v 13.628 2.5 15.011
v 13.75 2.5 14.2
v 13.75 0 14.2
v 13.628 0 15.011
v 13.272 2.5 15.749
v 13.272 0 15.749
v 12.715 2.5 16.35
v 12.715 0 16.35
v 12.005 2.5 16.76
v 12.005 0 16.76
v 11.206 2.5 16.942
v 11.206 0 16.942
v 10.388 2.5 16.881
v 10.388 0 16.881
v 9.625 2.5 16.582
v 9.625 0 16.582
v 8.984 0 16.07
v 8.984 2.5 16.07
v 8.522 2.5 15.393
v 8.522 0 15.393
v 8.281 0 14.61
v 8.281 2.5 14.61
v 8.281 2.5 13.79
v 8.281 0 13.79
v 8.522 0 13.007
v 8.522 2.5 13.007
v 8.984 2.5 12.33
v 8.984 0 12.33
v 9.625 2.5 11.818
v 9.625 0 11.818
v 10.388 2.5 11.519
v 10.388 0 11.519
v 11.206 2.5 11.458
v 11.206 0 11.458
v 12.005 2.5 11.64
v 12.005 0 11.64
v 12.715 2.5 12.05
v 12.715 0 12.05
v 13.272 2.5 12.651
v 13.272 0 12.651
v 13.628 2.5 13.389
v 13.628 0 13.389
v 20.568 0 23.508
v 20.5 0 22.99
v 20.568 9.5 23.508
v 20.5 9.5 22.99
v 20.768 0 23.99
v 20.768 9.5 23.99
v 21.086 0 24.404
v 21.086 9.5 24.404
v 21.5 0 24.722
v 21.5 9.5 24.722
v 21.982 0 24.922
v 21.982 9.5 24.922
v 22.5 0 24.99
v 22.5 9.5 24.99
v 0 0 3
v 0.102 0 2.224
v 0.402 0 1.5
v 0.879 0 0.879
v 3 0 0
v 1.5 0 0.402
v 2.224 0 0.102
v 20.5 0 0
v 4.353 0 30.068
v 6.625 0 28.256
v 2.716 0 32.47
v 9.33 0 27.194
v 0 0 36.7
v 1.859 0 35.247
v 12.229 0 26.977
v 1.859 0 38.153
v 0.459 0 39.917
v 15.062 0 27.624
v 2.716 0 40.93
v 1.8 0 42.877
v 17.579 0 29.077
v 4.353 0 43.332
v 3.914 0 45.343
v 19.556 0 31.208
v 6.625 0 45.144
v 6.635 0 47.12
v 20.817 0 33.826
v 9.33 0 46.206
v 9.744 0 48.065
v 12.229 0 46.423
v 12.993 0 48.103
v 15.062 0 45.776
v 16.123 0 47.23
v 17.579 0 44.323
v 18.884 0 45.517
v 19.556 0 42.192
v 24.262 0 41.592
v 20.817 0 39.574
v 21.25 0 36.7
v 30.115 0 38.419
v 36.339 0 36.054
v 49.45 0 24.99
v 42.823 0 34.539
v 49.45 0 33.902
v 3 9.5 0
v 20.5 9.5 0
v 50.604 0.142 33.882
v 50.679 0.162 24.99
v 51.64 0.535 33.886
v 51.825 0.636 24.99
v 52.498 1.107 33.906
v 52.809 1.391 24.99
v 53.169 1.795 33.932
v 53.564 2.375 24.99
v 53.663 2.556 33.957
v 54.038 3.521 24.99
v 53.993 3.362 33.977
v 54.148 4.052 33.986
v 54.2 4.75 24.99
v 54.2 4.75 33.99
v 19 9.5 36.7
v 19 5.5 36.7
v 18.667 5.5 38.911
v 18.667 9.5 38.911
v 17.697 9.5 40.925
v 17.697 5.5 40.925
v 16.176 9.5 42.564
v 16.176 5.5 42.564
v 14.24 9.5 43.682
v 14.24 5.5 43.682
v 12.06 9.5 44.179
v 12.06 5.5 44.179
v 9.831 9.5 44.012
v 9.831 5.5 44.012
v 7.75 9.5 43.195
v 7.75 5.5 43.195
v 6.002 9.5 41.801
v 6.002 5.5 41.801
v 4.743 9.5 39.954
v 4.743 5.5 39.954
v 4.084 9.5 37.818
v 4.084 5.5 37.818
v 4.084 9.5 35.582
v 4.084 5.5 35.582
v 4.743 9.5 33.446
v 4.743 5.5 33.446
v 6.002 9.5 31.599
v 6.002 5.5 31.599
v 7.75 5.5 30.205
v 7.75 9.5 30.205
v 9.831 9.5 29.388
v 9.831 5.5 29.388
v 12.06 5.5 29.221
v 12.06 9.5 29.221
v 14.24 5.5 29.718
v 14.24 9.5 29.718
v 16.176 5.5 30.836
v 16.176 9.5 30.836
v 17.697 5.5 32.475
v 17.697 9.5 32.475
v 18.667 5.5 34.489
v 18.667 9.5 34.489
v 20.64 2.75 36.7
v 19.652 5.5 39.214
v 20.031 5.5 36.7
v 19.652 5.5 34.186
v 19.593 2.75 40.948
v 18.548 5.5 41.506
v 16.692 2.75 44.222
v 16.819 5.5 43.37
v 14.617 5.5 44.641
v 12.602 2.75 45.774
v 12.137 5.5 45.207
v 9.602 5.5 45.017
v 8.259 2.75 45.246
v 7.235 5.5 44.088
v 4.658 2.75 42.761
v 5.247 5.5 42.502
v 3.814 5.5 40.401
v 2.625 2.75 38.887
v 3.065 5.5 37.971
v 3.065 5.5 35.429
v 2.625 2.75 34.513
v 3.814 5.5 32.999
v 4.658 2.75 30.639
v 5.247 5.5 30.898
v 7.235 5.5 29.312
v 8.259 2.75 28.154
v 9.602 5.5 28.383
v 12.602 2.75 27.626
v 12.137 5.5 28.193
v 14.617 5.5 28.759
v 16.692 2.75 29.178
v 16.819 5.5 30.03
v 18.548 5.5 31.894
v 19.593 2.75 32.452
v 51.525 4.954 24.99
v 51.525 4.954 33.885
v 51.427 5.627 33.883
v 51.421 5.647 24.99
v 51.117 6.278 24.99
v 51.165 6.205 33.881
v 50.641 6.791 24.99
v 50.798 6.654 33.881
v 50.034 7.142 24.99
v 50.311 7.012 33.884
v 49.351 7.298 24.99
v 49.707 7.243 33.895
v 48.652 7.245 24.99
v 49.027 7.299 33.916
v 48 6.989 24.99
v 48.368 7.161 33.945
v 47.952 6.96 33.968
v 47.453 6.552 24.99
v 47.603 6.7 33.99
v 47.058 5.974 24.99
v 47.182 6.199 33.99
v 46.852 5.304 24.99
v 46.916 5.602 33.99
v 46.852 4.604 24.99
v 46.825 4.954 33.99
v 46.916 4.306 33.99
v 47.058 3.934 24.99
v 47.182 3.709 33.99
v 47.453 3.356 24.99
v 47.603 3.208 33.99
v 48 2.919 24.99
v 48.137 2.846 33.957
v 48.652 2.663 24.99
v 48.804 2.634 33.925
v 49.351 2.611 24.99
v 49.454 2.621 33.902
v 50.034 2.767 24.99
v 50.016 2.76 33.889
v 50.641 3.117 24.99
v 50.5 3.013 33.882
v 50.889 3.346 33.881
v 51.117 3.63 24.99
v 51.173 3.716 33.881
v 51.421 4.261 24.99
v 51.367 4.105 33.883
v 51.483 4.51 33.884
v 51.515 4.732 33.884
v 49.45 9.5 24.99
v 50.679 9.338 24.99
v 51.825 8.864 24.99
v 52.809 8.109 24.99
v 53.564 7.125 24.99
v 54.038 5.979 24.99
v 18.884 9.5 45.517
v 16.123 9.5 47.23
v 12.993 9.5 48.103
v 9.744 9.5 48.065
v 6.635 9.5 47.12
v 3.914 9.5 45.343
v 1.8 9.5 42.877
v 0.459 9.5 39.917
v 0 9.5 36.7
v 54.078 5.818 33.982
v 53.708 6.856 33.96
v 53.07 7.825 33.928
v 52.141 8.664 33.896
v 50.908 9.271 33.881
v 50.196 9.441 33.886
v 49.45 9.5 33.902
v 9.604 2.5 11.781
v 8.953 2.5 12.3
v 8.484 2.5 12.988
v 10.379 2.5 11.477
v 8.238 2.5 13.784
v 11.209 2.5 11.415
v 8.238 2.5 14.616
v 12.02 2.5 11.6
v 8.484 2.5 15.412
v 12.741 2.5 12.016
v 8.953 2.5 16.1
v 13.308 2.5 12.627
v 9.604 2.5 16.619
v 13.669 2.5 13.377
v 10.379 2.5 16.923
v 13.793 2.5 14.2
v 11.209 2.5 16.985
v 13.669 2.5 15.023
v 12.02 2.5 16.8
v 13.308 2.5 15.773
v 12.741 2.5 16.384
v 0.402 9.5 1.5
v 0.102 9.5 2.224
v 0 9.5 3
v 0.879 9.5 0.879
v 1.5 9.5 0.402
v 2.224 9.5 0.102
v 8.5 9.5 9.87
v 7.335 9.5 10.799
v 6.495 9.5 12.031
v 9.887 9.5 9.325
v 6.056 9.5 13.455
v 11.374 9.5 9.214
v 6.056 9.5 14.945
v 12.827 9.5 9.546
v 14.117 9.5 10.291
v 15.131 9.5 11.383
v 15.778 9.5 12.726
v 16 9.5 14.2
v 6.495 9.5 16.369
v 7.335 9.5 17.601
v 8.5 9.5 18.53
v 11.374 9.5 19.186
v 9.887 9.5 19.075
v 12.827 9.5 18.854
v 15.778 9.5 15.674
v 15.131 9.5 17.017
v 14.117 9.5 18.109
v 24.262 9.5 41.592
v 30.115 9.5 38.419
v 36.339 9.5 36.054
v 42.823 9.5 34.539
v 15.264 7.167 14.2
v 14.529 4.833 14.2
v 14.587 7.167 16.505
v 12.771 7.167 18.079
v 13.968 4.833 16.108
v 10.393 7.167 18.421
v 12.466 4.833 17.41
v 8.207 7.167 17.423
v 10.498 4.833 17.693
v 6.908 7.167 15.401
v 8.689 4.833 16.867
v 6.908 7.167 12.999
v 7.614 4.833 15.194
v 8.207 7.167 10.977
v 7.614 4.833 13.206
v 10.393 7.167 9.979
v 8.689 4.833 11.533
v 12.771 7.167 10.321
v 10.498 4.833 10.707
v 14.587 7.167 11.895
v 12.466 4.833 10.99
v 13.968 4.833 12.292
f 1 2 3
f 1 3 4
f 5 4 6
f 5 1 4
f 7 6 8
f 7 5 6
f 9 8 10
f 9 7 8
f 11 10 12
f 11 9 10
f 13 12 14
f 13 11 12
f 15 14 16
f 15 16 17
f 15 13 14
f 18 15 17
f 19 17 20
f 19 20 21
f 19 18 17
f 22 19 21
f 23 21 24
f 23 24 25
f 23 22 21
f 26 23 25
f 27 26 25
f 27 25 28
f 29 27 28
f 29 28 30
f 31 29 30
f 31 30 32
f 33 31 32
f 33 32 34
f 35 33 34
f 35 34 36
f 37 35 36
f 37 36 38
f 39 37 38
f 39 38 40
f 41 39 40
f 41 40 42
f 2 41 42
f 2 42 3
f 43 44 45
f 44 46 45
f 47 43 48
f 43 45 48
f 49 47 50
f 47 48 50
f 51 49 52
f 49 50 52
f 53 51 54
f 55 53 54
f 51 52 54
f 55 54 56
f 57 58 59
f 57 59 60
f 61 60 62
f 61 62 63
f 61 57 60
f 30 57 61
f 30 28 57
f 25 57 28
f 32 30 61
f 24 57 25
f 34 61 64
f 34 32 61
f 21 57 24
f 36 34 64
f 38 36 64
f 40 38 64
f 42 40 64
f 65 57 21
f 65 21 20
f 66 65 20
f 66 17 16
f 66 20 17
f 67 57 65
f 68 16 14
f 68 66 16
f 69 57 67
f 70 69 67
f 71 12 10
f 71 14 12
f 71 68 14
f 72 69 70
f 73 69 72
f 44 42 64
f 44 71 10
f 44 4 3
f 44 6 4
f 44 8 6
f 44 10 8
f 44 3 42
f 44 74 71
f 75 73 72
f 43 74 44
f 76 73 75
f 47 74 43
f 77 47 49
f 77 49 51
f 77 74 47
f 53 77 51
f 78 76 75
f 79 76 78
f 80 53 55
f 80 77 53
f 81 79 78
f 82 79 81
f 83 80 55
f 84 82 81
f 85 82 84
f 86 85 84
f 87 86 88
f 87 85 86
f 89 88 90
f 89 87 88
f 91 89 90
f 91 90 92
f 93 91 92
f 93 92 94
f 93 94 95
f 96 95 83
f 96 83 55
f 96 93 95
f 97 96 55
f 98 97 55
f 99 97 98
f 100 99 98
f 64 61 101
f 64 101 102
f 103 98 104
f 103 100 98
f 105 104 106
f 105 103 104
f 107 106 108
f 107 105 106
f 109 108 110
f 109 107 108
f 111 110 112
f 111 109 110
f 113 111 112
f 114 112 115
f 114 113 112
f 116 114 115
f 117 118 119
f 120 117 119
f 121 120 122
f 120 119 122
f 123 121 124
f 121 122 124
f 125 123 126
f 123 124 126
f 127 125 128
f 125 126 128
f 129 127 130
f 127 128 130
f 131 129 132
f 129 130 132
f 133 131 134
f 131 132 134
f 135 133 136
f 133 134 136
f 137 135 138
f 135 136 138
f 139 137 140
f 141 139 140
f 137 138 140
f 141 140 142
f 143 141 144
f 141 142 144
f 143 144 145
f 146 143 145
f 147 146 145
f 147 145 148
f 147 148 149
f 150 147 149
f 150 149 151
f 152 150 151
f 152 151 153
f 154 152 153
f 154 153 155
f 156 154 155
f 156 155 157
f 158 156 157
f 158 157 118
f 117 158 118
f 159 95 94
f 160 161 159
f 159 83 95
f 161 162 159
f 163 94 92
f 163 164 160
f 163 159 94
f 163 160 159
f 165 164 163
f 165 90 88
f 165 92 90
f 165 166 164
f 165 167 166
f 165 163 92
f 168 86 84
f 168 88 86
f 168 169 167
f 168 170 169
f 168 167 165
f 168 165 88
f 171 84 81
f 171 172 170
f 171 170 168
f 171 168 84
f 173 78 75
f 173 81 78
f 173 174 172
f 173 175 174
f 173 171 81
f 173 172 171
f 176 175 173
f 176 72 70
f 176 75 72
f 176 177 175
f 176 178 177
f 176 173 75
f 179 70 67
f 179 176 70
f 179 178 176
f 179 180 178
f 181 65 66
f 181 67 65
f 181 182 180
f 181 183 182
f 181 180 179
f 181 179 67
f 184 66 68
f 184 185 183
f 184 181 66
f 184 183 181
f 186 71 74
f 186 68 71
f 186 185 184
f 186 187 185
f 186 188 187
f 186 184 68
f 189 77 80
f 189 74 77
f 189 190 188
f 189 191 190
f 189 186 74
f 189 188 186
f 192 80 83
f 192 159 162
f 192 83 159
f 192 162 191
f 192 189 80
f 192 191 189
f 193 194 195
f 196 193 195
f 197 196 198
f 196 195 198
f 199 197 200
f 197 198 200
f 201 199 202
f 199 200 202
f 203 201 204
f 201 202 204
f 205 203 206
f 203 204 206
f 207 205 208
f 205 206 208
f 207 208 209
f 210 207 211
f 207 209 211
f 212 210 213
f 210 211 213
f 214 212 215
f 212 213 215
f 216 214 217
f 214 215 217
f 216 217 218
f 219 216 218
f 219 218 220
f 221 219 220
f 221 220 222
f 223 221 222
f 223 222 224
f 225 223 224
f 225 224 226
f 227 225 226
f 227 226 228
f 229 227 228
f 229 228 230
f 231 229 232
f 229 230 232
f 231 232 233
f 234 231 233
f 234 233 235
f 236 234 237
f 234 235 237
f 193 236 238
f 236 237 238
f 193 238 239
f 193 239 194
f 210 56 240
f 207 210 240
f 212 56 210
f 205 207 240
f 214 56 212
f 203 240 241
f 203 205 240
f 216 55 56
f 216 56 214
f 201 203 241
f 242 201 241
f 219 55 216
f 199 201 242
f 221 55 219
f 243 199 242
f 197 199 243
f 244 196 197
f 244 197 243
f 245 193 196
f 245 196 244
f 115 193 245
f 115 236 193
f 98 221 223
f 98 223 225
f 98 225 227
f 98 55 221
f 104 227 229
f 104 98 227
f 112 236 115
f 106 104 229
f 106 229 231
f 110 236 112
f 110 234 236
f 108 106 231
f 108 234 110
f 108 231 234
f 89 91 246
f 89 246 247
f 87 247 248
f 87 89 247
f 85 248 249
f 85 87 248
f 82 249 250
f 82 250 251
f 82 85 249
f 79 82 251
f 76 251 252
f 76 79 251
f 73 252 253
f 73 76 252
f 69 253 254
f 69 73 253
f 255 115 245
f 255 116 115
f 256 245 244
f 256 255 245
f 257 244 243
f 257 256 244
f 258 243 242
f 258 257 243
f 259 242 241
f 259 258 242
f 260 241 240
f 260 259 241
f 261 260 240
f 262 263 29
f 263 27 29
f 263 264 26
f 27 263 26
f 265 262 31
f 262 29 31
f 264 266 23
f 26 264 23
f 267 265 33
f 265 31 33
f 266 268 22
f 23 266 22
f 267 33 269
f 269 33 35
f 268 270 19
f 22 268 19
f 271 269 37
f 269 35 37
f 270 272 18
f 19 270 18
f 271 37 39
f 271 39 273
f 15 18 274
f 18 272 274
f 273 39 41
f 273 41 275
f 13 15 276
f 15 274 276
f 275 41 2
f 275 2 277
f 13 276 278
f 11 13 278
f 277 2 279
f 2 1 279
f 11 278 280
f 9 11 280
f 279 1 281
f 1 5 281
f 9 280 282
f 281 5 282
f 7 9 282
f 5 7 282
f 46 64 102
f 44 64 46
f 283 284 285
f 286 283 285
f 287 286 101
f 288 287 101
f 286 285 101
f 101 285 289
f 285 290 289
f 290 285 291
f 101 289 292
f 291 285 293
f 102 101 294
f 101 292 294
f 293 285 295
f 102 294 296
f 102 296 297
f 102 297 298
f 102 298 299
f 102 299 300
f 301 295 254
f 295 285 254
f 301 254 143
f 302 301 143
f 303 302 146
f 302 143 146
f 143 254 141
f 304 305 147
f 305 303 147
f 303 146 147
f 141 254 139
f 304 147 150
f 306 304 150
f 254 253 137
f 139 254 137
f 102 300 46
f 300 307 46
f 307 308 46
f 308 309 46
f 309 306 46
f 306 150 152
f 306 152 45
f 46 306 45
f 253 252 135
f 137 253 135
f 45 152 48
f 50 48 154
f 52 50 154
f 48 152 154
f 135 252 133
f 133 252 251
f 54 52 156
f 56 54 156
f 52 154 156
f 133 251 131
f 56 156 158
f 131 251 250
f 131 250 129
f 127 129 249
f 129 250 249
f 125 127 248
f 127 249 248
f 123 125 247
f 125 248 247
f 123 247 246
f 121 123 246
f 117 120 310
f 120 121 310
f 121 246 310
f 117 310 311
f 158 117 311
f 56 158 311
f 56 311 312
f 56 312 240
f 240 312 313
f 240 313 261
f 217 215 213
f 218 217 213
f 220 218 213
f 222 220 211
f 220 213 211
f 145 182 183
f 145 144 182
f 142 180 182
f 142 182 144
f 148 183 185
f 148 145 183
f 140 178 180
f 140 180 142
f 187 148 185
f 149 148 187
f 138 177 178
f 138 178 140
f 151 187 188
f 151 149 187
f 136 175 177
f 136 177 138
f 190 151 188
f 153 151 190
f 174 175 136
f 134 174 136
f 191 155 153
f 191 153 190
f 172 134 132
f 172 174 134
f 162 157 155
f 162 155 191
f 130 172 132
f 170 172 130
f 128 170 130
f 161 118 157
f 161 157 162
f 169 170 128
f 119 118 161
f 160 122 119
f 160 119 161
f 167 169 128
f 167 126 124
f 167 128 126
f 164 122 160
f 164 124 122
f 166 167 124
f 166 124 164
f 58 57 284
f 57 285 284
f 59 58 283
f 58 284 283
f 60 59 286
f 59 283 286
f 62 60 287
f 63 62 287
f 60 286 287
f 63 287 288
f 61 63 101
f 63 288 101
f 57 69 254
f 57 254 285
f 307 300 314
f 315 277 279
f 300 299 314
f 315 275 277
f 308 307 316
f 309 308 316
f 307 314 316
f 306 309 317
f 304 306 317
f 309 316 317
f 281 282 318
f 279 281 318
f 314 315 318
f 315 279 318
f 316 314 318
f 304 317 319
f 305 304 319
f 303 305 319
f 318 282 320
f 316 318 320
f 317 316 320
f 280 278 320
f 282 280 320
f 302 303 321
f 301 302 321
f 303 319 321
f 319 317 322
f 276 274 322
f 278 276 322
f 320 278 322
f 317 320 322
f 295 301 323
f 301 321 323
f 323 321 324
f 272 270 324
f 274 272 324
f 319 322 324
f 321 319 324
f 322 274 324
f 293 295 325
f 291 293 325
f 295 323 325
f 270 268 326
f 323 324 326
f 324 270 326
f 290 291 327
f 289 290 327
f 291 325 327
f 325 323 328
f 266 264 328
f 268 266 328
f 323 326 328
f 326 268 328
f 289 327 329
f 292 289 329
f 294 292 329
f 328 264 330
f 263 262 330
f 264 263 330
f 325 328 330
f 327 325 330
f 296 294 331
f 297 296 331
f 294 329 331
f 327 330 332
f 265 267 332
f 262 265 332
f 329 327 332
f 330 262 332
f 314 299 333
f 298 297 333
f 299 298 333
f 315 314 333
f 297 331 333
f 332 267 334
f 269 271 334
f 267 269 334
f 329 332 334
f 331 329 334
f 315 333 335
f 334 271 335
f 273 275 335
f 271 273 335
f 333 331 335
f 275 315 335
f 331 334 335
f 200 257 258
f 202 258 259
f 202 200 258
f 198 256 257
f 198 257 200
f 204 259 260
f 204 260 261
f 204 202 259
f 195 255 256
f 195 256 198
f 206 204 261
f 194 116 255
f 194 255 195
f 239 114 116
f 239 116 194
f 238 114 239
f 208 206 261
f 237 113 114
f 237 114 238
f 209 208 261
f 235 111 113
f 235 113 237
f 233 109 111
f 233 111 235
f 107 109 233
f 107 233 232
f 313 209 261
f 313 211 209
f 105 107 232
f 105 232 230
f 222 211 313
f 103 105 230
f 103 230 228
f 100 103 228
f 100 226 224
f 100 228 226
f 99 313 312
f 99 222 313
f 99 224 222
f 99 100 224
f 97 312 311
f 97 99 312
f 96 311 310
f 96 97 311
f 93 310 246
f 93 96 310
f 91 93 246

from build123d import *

# Parameters (mm, degrees)
F1_DEPTH       = 9.5
F2_R           = 7.5
F3_DEPTH       = 9.5
F4_R           = 8.5
F5_DEPTH       = 5.5
F6_R           = 9.75
F7_DEPTH       = 5.5
F7_TAPER       = 12.5
F7_DEPTH_BACK  = 25
F8_R           = 4.75
F9_R           = 4.74999
F10_R          = 3
F11_R          = 2
F13_R          = 2.35
F14_DEPTH      = 10
F16_R          = 2.75
F17_DEPTH      = 9.5
F18_R          = 5
F19_DEPTH      = 7
F19_TAPER      = 17.5
F19_DEPTH_BACK = 7


# Not quite as in the source:
# - a fillet or chamfer is up to 0.001 mm smaller than in the source, because OpenCascade refuses the exact size


with BuildPart() as f1:
    # F0 (on Front) → F1 (new body)
    with BuildSketch(Plane.XZ):
        with BuildLine():
            Line((0, 36.7), (0, 0))
            Line((0, 0), (20.5, 0))
            Line((20.5, 0), (20.5, 24.9898828528))
            Line((20.5, 24.9898828528), (54.2, 24.9898828528))
            Line((54.2, 24.9898828528), (54.2, 33.9898828528))
            ThreePointArc((54.2, 33.9898828528), (35.4283305629, 36.3418613979), (18.8835293674, 45.5166600298))
            ThreePointArc((18.8835293674, 45.5166600298), (6.6348477786, 47.1201868439), (0, 36.7))
        make_face()
    extrude(amount=-F1_DEPTH)

    # F2 (on Front) → F3 (cut)
    with BuildSketch(Plane.XZ):
        with Locations((11.5, 36.7)):
            Circle(F2_R)
    extrude(amount=-F3_DEPTH, mode=Mode.SUBTRACT)

    # F4 (on Front) → F5 (cut)
    with BuildSketch(Plane.XZ):
        with Locations((11.5, 36.7)):
            Circle(F4_R)
    extrude(amount=-F5_DEPTH, mode=Mode.SUBTRACT)

    # F6 (on Front) → F7 (cut, two sides)
    with BuildSketch(Plane.XZ) as f7_sk:
        with Locations((11.5, 36.7)):
            Circle(F6_R)
    extrude(amount=-F7_DEPTH, taper=F7_TAPER, mode=Mode.SUBTRACT)
    extrude(f7_sk.sketch, amount=F7_DEPTH_BACK, mode=Mode.SUBTRACT)

    # F8
    f8_edges = [f1.edges().sort_by_distance(p)[0] for p in [
        (54.2, 0, 29.489883),
    ]]
    fillet(f8_edges, radius=F8_R)

    # F9 (radius 4.75 in the source; OpenCascade refuses exactly that, so slightly less here)
    f9_edges = [f1.edges().sort_by_distance(p)[0] for p in [
        (54.2, 9.5, 29.489883),
    ]]
    fillet(f9_edges, radius=F9_R)

    # F10
    f10_edges = [f1.edges().sort_by_distance(p)[0] for p in [
        (0, 4.75, 0),
    ]]
    fillet(f10_edges, radius=F10_R)

    # F11
    f11_edges = [f1.edges().sort_by_distance(p)[0] for p in [
        (20.5, 4.75, 24.989883),
    ]]
    fillet(f11_edges, radius=F11_R)

    # F13 (on face) → F14 (cut)
    with BuildSketch(Plane.XY.offset(33.9898828528)):
        with Locations((49.1753853858, 4.9540796317)):
            Circle(F13_R)
    extrude(amount=-F14_DEPTH, mode=Mode.SUBTRACT)

    # F16 (on offset) → F17 (cut)
    with BuildSketch(Plane.XZ.offset(-9.5)):
        with Locations((11, 14.2)):
            Circle(F16_R)
    extrude(amount=F17_DEPTH, mode=Mode.SUBTRACT)

    # F18 (on offset) → F19 (cut, two sides)
    with BuildSketch(Plane.XZ.offset(-9.5)) as f19_sk:
        with Locations((11, 14.2)):
            Circle(F18_R)
    extrude(amount=F19_DEPTH, taper=F19_TAPER, mode=Mode.SUBTRACT)
    extrude(f19_sk.sketch, amount=-F19_DEPTH_BACK, mode=Mode.SUBTRACT)


solid = f1.part
